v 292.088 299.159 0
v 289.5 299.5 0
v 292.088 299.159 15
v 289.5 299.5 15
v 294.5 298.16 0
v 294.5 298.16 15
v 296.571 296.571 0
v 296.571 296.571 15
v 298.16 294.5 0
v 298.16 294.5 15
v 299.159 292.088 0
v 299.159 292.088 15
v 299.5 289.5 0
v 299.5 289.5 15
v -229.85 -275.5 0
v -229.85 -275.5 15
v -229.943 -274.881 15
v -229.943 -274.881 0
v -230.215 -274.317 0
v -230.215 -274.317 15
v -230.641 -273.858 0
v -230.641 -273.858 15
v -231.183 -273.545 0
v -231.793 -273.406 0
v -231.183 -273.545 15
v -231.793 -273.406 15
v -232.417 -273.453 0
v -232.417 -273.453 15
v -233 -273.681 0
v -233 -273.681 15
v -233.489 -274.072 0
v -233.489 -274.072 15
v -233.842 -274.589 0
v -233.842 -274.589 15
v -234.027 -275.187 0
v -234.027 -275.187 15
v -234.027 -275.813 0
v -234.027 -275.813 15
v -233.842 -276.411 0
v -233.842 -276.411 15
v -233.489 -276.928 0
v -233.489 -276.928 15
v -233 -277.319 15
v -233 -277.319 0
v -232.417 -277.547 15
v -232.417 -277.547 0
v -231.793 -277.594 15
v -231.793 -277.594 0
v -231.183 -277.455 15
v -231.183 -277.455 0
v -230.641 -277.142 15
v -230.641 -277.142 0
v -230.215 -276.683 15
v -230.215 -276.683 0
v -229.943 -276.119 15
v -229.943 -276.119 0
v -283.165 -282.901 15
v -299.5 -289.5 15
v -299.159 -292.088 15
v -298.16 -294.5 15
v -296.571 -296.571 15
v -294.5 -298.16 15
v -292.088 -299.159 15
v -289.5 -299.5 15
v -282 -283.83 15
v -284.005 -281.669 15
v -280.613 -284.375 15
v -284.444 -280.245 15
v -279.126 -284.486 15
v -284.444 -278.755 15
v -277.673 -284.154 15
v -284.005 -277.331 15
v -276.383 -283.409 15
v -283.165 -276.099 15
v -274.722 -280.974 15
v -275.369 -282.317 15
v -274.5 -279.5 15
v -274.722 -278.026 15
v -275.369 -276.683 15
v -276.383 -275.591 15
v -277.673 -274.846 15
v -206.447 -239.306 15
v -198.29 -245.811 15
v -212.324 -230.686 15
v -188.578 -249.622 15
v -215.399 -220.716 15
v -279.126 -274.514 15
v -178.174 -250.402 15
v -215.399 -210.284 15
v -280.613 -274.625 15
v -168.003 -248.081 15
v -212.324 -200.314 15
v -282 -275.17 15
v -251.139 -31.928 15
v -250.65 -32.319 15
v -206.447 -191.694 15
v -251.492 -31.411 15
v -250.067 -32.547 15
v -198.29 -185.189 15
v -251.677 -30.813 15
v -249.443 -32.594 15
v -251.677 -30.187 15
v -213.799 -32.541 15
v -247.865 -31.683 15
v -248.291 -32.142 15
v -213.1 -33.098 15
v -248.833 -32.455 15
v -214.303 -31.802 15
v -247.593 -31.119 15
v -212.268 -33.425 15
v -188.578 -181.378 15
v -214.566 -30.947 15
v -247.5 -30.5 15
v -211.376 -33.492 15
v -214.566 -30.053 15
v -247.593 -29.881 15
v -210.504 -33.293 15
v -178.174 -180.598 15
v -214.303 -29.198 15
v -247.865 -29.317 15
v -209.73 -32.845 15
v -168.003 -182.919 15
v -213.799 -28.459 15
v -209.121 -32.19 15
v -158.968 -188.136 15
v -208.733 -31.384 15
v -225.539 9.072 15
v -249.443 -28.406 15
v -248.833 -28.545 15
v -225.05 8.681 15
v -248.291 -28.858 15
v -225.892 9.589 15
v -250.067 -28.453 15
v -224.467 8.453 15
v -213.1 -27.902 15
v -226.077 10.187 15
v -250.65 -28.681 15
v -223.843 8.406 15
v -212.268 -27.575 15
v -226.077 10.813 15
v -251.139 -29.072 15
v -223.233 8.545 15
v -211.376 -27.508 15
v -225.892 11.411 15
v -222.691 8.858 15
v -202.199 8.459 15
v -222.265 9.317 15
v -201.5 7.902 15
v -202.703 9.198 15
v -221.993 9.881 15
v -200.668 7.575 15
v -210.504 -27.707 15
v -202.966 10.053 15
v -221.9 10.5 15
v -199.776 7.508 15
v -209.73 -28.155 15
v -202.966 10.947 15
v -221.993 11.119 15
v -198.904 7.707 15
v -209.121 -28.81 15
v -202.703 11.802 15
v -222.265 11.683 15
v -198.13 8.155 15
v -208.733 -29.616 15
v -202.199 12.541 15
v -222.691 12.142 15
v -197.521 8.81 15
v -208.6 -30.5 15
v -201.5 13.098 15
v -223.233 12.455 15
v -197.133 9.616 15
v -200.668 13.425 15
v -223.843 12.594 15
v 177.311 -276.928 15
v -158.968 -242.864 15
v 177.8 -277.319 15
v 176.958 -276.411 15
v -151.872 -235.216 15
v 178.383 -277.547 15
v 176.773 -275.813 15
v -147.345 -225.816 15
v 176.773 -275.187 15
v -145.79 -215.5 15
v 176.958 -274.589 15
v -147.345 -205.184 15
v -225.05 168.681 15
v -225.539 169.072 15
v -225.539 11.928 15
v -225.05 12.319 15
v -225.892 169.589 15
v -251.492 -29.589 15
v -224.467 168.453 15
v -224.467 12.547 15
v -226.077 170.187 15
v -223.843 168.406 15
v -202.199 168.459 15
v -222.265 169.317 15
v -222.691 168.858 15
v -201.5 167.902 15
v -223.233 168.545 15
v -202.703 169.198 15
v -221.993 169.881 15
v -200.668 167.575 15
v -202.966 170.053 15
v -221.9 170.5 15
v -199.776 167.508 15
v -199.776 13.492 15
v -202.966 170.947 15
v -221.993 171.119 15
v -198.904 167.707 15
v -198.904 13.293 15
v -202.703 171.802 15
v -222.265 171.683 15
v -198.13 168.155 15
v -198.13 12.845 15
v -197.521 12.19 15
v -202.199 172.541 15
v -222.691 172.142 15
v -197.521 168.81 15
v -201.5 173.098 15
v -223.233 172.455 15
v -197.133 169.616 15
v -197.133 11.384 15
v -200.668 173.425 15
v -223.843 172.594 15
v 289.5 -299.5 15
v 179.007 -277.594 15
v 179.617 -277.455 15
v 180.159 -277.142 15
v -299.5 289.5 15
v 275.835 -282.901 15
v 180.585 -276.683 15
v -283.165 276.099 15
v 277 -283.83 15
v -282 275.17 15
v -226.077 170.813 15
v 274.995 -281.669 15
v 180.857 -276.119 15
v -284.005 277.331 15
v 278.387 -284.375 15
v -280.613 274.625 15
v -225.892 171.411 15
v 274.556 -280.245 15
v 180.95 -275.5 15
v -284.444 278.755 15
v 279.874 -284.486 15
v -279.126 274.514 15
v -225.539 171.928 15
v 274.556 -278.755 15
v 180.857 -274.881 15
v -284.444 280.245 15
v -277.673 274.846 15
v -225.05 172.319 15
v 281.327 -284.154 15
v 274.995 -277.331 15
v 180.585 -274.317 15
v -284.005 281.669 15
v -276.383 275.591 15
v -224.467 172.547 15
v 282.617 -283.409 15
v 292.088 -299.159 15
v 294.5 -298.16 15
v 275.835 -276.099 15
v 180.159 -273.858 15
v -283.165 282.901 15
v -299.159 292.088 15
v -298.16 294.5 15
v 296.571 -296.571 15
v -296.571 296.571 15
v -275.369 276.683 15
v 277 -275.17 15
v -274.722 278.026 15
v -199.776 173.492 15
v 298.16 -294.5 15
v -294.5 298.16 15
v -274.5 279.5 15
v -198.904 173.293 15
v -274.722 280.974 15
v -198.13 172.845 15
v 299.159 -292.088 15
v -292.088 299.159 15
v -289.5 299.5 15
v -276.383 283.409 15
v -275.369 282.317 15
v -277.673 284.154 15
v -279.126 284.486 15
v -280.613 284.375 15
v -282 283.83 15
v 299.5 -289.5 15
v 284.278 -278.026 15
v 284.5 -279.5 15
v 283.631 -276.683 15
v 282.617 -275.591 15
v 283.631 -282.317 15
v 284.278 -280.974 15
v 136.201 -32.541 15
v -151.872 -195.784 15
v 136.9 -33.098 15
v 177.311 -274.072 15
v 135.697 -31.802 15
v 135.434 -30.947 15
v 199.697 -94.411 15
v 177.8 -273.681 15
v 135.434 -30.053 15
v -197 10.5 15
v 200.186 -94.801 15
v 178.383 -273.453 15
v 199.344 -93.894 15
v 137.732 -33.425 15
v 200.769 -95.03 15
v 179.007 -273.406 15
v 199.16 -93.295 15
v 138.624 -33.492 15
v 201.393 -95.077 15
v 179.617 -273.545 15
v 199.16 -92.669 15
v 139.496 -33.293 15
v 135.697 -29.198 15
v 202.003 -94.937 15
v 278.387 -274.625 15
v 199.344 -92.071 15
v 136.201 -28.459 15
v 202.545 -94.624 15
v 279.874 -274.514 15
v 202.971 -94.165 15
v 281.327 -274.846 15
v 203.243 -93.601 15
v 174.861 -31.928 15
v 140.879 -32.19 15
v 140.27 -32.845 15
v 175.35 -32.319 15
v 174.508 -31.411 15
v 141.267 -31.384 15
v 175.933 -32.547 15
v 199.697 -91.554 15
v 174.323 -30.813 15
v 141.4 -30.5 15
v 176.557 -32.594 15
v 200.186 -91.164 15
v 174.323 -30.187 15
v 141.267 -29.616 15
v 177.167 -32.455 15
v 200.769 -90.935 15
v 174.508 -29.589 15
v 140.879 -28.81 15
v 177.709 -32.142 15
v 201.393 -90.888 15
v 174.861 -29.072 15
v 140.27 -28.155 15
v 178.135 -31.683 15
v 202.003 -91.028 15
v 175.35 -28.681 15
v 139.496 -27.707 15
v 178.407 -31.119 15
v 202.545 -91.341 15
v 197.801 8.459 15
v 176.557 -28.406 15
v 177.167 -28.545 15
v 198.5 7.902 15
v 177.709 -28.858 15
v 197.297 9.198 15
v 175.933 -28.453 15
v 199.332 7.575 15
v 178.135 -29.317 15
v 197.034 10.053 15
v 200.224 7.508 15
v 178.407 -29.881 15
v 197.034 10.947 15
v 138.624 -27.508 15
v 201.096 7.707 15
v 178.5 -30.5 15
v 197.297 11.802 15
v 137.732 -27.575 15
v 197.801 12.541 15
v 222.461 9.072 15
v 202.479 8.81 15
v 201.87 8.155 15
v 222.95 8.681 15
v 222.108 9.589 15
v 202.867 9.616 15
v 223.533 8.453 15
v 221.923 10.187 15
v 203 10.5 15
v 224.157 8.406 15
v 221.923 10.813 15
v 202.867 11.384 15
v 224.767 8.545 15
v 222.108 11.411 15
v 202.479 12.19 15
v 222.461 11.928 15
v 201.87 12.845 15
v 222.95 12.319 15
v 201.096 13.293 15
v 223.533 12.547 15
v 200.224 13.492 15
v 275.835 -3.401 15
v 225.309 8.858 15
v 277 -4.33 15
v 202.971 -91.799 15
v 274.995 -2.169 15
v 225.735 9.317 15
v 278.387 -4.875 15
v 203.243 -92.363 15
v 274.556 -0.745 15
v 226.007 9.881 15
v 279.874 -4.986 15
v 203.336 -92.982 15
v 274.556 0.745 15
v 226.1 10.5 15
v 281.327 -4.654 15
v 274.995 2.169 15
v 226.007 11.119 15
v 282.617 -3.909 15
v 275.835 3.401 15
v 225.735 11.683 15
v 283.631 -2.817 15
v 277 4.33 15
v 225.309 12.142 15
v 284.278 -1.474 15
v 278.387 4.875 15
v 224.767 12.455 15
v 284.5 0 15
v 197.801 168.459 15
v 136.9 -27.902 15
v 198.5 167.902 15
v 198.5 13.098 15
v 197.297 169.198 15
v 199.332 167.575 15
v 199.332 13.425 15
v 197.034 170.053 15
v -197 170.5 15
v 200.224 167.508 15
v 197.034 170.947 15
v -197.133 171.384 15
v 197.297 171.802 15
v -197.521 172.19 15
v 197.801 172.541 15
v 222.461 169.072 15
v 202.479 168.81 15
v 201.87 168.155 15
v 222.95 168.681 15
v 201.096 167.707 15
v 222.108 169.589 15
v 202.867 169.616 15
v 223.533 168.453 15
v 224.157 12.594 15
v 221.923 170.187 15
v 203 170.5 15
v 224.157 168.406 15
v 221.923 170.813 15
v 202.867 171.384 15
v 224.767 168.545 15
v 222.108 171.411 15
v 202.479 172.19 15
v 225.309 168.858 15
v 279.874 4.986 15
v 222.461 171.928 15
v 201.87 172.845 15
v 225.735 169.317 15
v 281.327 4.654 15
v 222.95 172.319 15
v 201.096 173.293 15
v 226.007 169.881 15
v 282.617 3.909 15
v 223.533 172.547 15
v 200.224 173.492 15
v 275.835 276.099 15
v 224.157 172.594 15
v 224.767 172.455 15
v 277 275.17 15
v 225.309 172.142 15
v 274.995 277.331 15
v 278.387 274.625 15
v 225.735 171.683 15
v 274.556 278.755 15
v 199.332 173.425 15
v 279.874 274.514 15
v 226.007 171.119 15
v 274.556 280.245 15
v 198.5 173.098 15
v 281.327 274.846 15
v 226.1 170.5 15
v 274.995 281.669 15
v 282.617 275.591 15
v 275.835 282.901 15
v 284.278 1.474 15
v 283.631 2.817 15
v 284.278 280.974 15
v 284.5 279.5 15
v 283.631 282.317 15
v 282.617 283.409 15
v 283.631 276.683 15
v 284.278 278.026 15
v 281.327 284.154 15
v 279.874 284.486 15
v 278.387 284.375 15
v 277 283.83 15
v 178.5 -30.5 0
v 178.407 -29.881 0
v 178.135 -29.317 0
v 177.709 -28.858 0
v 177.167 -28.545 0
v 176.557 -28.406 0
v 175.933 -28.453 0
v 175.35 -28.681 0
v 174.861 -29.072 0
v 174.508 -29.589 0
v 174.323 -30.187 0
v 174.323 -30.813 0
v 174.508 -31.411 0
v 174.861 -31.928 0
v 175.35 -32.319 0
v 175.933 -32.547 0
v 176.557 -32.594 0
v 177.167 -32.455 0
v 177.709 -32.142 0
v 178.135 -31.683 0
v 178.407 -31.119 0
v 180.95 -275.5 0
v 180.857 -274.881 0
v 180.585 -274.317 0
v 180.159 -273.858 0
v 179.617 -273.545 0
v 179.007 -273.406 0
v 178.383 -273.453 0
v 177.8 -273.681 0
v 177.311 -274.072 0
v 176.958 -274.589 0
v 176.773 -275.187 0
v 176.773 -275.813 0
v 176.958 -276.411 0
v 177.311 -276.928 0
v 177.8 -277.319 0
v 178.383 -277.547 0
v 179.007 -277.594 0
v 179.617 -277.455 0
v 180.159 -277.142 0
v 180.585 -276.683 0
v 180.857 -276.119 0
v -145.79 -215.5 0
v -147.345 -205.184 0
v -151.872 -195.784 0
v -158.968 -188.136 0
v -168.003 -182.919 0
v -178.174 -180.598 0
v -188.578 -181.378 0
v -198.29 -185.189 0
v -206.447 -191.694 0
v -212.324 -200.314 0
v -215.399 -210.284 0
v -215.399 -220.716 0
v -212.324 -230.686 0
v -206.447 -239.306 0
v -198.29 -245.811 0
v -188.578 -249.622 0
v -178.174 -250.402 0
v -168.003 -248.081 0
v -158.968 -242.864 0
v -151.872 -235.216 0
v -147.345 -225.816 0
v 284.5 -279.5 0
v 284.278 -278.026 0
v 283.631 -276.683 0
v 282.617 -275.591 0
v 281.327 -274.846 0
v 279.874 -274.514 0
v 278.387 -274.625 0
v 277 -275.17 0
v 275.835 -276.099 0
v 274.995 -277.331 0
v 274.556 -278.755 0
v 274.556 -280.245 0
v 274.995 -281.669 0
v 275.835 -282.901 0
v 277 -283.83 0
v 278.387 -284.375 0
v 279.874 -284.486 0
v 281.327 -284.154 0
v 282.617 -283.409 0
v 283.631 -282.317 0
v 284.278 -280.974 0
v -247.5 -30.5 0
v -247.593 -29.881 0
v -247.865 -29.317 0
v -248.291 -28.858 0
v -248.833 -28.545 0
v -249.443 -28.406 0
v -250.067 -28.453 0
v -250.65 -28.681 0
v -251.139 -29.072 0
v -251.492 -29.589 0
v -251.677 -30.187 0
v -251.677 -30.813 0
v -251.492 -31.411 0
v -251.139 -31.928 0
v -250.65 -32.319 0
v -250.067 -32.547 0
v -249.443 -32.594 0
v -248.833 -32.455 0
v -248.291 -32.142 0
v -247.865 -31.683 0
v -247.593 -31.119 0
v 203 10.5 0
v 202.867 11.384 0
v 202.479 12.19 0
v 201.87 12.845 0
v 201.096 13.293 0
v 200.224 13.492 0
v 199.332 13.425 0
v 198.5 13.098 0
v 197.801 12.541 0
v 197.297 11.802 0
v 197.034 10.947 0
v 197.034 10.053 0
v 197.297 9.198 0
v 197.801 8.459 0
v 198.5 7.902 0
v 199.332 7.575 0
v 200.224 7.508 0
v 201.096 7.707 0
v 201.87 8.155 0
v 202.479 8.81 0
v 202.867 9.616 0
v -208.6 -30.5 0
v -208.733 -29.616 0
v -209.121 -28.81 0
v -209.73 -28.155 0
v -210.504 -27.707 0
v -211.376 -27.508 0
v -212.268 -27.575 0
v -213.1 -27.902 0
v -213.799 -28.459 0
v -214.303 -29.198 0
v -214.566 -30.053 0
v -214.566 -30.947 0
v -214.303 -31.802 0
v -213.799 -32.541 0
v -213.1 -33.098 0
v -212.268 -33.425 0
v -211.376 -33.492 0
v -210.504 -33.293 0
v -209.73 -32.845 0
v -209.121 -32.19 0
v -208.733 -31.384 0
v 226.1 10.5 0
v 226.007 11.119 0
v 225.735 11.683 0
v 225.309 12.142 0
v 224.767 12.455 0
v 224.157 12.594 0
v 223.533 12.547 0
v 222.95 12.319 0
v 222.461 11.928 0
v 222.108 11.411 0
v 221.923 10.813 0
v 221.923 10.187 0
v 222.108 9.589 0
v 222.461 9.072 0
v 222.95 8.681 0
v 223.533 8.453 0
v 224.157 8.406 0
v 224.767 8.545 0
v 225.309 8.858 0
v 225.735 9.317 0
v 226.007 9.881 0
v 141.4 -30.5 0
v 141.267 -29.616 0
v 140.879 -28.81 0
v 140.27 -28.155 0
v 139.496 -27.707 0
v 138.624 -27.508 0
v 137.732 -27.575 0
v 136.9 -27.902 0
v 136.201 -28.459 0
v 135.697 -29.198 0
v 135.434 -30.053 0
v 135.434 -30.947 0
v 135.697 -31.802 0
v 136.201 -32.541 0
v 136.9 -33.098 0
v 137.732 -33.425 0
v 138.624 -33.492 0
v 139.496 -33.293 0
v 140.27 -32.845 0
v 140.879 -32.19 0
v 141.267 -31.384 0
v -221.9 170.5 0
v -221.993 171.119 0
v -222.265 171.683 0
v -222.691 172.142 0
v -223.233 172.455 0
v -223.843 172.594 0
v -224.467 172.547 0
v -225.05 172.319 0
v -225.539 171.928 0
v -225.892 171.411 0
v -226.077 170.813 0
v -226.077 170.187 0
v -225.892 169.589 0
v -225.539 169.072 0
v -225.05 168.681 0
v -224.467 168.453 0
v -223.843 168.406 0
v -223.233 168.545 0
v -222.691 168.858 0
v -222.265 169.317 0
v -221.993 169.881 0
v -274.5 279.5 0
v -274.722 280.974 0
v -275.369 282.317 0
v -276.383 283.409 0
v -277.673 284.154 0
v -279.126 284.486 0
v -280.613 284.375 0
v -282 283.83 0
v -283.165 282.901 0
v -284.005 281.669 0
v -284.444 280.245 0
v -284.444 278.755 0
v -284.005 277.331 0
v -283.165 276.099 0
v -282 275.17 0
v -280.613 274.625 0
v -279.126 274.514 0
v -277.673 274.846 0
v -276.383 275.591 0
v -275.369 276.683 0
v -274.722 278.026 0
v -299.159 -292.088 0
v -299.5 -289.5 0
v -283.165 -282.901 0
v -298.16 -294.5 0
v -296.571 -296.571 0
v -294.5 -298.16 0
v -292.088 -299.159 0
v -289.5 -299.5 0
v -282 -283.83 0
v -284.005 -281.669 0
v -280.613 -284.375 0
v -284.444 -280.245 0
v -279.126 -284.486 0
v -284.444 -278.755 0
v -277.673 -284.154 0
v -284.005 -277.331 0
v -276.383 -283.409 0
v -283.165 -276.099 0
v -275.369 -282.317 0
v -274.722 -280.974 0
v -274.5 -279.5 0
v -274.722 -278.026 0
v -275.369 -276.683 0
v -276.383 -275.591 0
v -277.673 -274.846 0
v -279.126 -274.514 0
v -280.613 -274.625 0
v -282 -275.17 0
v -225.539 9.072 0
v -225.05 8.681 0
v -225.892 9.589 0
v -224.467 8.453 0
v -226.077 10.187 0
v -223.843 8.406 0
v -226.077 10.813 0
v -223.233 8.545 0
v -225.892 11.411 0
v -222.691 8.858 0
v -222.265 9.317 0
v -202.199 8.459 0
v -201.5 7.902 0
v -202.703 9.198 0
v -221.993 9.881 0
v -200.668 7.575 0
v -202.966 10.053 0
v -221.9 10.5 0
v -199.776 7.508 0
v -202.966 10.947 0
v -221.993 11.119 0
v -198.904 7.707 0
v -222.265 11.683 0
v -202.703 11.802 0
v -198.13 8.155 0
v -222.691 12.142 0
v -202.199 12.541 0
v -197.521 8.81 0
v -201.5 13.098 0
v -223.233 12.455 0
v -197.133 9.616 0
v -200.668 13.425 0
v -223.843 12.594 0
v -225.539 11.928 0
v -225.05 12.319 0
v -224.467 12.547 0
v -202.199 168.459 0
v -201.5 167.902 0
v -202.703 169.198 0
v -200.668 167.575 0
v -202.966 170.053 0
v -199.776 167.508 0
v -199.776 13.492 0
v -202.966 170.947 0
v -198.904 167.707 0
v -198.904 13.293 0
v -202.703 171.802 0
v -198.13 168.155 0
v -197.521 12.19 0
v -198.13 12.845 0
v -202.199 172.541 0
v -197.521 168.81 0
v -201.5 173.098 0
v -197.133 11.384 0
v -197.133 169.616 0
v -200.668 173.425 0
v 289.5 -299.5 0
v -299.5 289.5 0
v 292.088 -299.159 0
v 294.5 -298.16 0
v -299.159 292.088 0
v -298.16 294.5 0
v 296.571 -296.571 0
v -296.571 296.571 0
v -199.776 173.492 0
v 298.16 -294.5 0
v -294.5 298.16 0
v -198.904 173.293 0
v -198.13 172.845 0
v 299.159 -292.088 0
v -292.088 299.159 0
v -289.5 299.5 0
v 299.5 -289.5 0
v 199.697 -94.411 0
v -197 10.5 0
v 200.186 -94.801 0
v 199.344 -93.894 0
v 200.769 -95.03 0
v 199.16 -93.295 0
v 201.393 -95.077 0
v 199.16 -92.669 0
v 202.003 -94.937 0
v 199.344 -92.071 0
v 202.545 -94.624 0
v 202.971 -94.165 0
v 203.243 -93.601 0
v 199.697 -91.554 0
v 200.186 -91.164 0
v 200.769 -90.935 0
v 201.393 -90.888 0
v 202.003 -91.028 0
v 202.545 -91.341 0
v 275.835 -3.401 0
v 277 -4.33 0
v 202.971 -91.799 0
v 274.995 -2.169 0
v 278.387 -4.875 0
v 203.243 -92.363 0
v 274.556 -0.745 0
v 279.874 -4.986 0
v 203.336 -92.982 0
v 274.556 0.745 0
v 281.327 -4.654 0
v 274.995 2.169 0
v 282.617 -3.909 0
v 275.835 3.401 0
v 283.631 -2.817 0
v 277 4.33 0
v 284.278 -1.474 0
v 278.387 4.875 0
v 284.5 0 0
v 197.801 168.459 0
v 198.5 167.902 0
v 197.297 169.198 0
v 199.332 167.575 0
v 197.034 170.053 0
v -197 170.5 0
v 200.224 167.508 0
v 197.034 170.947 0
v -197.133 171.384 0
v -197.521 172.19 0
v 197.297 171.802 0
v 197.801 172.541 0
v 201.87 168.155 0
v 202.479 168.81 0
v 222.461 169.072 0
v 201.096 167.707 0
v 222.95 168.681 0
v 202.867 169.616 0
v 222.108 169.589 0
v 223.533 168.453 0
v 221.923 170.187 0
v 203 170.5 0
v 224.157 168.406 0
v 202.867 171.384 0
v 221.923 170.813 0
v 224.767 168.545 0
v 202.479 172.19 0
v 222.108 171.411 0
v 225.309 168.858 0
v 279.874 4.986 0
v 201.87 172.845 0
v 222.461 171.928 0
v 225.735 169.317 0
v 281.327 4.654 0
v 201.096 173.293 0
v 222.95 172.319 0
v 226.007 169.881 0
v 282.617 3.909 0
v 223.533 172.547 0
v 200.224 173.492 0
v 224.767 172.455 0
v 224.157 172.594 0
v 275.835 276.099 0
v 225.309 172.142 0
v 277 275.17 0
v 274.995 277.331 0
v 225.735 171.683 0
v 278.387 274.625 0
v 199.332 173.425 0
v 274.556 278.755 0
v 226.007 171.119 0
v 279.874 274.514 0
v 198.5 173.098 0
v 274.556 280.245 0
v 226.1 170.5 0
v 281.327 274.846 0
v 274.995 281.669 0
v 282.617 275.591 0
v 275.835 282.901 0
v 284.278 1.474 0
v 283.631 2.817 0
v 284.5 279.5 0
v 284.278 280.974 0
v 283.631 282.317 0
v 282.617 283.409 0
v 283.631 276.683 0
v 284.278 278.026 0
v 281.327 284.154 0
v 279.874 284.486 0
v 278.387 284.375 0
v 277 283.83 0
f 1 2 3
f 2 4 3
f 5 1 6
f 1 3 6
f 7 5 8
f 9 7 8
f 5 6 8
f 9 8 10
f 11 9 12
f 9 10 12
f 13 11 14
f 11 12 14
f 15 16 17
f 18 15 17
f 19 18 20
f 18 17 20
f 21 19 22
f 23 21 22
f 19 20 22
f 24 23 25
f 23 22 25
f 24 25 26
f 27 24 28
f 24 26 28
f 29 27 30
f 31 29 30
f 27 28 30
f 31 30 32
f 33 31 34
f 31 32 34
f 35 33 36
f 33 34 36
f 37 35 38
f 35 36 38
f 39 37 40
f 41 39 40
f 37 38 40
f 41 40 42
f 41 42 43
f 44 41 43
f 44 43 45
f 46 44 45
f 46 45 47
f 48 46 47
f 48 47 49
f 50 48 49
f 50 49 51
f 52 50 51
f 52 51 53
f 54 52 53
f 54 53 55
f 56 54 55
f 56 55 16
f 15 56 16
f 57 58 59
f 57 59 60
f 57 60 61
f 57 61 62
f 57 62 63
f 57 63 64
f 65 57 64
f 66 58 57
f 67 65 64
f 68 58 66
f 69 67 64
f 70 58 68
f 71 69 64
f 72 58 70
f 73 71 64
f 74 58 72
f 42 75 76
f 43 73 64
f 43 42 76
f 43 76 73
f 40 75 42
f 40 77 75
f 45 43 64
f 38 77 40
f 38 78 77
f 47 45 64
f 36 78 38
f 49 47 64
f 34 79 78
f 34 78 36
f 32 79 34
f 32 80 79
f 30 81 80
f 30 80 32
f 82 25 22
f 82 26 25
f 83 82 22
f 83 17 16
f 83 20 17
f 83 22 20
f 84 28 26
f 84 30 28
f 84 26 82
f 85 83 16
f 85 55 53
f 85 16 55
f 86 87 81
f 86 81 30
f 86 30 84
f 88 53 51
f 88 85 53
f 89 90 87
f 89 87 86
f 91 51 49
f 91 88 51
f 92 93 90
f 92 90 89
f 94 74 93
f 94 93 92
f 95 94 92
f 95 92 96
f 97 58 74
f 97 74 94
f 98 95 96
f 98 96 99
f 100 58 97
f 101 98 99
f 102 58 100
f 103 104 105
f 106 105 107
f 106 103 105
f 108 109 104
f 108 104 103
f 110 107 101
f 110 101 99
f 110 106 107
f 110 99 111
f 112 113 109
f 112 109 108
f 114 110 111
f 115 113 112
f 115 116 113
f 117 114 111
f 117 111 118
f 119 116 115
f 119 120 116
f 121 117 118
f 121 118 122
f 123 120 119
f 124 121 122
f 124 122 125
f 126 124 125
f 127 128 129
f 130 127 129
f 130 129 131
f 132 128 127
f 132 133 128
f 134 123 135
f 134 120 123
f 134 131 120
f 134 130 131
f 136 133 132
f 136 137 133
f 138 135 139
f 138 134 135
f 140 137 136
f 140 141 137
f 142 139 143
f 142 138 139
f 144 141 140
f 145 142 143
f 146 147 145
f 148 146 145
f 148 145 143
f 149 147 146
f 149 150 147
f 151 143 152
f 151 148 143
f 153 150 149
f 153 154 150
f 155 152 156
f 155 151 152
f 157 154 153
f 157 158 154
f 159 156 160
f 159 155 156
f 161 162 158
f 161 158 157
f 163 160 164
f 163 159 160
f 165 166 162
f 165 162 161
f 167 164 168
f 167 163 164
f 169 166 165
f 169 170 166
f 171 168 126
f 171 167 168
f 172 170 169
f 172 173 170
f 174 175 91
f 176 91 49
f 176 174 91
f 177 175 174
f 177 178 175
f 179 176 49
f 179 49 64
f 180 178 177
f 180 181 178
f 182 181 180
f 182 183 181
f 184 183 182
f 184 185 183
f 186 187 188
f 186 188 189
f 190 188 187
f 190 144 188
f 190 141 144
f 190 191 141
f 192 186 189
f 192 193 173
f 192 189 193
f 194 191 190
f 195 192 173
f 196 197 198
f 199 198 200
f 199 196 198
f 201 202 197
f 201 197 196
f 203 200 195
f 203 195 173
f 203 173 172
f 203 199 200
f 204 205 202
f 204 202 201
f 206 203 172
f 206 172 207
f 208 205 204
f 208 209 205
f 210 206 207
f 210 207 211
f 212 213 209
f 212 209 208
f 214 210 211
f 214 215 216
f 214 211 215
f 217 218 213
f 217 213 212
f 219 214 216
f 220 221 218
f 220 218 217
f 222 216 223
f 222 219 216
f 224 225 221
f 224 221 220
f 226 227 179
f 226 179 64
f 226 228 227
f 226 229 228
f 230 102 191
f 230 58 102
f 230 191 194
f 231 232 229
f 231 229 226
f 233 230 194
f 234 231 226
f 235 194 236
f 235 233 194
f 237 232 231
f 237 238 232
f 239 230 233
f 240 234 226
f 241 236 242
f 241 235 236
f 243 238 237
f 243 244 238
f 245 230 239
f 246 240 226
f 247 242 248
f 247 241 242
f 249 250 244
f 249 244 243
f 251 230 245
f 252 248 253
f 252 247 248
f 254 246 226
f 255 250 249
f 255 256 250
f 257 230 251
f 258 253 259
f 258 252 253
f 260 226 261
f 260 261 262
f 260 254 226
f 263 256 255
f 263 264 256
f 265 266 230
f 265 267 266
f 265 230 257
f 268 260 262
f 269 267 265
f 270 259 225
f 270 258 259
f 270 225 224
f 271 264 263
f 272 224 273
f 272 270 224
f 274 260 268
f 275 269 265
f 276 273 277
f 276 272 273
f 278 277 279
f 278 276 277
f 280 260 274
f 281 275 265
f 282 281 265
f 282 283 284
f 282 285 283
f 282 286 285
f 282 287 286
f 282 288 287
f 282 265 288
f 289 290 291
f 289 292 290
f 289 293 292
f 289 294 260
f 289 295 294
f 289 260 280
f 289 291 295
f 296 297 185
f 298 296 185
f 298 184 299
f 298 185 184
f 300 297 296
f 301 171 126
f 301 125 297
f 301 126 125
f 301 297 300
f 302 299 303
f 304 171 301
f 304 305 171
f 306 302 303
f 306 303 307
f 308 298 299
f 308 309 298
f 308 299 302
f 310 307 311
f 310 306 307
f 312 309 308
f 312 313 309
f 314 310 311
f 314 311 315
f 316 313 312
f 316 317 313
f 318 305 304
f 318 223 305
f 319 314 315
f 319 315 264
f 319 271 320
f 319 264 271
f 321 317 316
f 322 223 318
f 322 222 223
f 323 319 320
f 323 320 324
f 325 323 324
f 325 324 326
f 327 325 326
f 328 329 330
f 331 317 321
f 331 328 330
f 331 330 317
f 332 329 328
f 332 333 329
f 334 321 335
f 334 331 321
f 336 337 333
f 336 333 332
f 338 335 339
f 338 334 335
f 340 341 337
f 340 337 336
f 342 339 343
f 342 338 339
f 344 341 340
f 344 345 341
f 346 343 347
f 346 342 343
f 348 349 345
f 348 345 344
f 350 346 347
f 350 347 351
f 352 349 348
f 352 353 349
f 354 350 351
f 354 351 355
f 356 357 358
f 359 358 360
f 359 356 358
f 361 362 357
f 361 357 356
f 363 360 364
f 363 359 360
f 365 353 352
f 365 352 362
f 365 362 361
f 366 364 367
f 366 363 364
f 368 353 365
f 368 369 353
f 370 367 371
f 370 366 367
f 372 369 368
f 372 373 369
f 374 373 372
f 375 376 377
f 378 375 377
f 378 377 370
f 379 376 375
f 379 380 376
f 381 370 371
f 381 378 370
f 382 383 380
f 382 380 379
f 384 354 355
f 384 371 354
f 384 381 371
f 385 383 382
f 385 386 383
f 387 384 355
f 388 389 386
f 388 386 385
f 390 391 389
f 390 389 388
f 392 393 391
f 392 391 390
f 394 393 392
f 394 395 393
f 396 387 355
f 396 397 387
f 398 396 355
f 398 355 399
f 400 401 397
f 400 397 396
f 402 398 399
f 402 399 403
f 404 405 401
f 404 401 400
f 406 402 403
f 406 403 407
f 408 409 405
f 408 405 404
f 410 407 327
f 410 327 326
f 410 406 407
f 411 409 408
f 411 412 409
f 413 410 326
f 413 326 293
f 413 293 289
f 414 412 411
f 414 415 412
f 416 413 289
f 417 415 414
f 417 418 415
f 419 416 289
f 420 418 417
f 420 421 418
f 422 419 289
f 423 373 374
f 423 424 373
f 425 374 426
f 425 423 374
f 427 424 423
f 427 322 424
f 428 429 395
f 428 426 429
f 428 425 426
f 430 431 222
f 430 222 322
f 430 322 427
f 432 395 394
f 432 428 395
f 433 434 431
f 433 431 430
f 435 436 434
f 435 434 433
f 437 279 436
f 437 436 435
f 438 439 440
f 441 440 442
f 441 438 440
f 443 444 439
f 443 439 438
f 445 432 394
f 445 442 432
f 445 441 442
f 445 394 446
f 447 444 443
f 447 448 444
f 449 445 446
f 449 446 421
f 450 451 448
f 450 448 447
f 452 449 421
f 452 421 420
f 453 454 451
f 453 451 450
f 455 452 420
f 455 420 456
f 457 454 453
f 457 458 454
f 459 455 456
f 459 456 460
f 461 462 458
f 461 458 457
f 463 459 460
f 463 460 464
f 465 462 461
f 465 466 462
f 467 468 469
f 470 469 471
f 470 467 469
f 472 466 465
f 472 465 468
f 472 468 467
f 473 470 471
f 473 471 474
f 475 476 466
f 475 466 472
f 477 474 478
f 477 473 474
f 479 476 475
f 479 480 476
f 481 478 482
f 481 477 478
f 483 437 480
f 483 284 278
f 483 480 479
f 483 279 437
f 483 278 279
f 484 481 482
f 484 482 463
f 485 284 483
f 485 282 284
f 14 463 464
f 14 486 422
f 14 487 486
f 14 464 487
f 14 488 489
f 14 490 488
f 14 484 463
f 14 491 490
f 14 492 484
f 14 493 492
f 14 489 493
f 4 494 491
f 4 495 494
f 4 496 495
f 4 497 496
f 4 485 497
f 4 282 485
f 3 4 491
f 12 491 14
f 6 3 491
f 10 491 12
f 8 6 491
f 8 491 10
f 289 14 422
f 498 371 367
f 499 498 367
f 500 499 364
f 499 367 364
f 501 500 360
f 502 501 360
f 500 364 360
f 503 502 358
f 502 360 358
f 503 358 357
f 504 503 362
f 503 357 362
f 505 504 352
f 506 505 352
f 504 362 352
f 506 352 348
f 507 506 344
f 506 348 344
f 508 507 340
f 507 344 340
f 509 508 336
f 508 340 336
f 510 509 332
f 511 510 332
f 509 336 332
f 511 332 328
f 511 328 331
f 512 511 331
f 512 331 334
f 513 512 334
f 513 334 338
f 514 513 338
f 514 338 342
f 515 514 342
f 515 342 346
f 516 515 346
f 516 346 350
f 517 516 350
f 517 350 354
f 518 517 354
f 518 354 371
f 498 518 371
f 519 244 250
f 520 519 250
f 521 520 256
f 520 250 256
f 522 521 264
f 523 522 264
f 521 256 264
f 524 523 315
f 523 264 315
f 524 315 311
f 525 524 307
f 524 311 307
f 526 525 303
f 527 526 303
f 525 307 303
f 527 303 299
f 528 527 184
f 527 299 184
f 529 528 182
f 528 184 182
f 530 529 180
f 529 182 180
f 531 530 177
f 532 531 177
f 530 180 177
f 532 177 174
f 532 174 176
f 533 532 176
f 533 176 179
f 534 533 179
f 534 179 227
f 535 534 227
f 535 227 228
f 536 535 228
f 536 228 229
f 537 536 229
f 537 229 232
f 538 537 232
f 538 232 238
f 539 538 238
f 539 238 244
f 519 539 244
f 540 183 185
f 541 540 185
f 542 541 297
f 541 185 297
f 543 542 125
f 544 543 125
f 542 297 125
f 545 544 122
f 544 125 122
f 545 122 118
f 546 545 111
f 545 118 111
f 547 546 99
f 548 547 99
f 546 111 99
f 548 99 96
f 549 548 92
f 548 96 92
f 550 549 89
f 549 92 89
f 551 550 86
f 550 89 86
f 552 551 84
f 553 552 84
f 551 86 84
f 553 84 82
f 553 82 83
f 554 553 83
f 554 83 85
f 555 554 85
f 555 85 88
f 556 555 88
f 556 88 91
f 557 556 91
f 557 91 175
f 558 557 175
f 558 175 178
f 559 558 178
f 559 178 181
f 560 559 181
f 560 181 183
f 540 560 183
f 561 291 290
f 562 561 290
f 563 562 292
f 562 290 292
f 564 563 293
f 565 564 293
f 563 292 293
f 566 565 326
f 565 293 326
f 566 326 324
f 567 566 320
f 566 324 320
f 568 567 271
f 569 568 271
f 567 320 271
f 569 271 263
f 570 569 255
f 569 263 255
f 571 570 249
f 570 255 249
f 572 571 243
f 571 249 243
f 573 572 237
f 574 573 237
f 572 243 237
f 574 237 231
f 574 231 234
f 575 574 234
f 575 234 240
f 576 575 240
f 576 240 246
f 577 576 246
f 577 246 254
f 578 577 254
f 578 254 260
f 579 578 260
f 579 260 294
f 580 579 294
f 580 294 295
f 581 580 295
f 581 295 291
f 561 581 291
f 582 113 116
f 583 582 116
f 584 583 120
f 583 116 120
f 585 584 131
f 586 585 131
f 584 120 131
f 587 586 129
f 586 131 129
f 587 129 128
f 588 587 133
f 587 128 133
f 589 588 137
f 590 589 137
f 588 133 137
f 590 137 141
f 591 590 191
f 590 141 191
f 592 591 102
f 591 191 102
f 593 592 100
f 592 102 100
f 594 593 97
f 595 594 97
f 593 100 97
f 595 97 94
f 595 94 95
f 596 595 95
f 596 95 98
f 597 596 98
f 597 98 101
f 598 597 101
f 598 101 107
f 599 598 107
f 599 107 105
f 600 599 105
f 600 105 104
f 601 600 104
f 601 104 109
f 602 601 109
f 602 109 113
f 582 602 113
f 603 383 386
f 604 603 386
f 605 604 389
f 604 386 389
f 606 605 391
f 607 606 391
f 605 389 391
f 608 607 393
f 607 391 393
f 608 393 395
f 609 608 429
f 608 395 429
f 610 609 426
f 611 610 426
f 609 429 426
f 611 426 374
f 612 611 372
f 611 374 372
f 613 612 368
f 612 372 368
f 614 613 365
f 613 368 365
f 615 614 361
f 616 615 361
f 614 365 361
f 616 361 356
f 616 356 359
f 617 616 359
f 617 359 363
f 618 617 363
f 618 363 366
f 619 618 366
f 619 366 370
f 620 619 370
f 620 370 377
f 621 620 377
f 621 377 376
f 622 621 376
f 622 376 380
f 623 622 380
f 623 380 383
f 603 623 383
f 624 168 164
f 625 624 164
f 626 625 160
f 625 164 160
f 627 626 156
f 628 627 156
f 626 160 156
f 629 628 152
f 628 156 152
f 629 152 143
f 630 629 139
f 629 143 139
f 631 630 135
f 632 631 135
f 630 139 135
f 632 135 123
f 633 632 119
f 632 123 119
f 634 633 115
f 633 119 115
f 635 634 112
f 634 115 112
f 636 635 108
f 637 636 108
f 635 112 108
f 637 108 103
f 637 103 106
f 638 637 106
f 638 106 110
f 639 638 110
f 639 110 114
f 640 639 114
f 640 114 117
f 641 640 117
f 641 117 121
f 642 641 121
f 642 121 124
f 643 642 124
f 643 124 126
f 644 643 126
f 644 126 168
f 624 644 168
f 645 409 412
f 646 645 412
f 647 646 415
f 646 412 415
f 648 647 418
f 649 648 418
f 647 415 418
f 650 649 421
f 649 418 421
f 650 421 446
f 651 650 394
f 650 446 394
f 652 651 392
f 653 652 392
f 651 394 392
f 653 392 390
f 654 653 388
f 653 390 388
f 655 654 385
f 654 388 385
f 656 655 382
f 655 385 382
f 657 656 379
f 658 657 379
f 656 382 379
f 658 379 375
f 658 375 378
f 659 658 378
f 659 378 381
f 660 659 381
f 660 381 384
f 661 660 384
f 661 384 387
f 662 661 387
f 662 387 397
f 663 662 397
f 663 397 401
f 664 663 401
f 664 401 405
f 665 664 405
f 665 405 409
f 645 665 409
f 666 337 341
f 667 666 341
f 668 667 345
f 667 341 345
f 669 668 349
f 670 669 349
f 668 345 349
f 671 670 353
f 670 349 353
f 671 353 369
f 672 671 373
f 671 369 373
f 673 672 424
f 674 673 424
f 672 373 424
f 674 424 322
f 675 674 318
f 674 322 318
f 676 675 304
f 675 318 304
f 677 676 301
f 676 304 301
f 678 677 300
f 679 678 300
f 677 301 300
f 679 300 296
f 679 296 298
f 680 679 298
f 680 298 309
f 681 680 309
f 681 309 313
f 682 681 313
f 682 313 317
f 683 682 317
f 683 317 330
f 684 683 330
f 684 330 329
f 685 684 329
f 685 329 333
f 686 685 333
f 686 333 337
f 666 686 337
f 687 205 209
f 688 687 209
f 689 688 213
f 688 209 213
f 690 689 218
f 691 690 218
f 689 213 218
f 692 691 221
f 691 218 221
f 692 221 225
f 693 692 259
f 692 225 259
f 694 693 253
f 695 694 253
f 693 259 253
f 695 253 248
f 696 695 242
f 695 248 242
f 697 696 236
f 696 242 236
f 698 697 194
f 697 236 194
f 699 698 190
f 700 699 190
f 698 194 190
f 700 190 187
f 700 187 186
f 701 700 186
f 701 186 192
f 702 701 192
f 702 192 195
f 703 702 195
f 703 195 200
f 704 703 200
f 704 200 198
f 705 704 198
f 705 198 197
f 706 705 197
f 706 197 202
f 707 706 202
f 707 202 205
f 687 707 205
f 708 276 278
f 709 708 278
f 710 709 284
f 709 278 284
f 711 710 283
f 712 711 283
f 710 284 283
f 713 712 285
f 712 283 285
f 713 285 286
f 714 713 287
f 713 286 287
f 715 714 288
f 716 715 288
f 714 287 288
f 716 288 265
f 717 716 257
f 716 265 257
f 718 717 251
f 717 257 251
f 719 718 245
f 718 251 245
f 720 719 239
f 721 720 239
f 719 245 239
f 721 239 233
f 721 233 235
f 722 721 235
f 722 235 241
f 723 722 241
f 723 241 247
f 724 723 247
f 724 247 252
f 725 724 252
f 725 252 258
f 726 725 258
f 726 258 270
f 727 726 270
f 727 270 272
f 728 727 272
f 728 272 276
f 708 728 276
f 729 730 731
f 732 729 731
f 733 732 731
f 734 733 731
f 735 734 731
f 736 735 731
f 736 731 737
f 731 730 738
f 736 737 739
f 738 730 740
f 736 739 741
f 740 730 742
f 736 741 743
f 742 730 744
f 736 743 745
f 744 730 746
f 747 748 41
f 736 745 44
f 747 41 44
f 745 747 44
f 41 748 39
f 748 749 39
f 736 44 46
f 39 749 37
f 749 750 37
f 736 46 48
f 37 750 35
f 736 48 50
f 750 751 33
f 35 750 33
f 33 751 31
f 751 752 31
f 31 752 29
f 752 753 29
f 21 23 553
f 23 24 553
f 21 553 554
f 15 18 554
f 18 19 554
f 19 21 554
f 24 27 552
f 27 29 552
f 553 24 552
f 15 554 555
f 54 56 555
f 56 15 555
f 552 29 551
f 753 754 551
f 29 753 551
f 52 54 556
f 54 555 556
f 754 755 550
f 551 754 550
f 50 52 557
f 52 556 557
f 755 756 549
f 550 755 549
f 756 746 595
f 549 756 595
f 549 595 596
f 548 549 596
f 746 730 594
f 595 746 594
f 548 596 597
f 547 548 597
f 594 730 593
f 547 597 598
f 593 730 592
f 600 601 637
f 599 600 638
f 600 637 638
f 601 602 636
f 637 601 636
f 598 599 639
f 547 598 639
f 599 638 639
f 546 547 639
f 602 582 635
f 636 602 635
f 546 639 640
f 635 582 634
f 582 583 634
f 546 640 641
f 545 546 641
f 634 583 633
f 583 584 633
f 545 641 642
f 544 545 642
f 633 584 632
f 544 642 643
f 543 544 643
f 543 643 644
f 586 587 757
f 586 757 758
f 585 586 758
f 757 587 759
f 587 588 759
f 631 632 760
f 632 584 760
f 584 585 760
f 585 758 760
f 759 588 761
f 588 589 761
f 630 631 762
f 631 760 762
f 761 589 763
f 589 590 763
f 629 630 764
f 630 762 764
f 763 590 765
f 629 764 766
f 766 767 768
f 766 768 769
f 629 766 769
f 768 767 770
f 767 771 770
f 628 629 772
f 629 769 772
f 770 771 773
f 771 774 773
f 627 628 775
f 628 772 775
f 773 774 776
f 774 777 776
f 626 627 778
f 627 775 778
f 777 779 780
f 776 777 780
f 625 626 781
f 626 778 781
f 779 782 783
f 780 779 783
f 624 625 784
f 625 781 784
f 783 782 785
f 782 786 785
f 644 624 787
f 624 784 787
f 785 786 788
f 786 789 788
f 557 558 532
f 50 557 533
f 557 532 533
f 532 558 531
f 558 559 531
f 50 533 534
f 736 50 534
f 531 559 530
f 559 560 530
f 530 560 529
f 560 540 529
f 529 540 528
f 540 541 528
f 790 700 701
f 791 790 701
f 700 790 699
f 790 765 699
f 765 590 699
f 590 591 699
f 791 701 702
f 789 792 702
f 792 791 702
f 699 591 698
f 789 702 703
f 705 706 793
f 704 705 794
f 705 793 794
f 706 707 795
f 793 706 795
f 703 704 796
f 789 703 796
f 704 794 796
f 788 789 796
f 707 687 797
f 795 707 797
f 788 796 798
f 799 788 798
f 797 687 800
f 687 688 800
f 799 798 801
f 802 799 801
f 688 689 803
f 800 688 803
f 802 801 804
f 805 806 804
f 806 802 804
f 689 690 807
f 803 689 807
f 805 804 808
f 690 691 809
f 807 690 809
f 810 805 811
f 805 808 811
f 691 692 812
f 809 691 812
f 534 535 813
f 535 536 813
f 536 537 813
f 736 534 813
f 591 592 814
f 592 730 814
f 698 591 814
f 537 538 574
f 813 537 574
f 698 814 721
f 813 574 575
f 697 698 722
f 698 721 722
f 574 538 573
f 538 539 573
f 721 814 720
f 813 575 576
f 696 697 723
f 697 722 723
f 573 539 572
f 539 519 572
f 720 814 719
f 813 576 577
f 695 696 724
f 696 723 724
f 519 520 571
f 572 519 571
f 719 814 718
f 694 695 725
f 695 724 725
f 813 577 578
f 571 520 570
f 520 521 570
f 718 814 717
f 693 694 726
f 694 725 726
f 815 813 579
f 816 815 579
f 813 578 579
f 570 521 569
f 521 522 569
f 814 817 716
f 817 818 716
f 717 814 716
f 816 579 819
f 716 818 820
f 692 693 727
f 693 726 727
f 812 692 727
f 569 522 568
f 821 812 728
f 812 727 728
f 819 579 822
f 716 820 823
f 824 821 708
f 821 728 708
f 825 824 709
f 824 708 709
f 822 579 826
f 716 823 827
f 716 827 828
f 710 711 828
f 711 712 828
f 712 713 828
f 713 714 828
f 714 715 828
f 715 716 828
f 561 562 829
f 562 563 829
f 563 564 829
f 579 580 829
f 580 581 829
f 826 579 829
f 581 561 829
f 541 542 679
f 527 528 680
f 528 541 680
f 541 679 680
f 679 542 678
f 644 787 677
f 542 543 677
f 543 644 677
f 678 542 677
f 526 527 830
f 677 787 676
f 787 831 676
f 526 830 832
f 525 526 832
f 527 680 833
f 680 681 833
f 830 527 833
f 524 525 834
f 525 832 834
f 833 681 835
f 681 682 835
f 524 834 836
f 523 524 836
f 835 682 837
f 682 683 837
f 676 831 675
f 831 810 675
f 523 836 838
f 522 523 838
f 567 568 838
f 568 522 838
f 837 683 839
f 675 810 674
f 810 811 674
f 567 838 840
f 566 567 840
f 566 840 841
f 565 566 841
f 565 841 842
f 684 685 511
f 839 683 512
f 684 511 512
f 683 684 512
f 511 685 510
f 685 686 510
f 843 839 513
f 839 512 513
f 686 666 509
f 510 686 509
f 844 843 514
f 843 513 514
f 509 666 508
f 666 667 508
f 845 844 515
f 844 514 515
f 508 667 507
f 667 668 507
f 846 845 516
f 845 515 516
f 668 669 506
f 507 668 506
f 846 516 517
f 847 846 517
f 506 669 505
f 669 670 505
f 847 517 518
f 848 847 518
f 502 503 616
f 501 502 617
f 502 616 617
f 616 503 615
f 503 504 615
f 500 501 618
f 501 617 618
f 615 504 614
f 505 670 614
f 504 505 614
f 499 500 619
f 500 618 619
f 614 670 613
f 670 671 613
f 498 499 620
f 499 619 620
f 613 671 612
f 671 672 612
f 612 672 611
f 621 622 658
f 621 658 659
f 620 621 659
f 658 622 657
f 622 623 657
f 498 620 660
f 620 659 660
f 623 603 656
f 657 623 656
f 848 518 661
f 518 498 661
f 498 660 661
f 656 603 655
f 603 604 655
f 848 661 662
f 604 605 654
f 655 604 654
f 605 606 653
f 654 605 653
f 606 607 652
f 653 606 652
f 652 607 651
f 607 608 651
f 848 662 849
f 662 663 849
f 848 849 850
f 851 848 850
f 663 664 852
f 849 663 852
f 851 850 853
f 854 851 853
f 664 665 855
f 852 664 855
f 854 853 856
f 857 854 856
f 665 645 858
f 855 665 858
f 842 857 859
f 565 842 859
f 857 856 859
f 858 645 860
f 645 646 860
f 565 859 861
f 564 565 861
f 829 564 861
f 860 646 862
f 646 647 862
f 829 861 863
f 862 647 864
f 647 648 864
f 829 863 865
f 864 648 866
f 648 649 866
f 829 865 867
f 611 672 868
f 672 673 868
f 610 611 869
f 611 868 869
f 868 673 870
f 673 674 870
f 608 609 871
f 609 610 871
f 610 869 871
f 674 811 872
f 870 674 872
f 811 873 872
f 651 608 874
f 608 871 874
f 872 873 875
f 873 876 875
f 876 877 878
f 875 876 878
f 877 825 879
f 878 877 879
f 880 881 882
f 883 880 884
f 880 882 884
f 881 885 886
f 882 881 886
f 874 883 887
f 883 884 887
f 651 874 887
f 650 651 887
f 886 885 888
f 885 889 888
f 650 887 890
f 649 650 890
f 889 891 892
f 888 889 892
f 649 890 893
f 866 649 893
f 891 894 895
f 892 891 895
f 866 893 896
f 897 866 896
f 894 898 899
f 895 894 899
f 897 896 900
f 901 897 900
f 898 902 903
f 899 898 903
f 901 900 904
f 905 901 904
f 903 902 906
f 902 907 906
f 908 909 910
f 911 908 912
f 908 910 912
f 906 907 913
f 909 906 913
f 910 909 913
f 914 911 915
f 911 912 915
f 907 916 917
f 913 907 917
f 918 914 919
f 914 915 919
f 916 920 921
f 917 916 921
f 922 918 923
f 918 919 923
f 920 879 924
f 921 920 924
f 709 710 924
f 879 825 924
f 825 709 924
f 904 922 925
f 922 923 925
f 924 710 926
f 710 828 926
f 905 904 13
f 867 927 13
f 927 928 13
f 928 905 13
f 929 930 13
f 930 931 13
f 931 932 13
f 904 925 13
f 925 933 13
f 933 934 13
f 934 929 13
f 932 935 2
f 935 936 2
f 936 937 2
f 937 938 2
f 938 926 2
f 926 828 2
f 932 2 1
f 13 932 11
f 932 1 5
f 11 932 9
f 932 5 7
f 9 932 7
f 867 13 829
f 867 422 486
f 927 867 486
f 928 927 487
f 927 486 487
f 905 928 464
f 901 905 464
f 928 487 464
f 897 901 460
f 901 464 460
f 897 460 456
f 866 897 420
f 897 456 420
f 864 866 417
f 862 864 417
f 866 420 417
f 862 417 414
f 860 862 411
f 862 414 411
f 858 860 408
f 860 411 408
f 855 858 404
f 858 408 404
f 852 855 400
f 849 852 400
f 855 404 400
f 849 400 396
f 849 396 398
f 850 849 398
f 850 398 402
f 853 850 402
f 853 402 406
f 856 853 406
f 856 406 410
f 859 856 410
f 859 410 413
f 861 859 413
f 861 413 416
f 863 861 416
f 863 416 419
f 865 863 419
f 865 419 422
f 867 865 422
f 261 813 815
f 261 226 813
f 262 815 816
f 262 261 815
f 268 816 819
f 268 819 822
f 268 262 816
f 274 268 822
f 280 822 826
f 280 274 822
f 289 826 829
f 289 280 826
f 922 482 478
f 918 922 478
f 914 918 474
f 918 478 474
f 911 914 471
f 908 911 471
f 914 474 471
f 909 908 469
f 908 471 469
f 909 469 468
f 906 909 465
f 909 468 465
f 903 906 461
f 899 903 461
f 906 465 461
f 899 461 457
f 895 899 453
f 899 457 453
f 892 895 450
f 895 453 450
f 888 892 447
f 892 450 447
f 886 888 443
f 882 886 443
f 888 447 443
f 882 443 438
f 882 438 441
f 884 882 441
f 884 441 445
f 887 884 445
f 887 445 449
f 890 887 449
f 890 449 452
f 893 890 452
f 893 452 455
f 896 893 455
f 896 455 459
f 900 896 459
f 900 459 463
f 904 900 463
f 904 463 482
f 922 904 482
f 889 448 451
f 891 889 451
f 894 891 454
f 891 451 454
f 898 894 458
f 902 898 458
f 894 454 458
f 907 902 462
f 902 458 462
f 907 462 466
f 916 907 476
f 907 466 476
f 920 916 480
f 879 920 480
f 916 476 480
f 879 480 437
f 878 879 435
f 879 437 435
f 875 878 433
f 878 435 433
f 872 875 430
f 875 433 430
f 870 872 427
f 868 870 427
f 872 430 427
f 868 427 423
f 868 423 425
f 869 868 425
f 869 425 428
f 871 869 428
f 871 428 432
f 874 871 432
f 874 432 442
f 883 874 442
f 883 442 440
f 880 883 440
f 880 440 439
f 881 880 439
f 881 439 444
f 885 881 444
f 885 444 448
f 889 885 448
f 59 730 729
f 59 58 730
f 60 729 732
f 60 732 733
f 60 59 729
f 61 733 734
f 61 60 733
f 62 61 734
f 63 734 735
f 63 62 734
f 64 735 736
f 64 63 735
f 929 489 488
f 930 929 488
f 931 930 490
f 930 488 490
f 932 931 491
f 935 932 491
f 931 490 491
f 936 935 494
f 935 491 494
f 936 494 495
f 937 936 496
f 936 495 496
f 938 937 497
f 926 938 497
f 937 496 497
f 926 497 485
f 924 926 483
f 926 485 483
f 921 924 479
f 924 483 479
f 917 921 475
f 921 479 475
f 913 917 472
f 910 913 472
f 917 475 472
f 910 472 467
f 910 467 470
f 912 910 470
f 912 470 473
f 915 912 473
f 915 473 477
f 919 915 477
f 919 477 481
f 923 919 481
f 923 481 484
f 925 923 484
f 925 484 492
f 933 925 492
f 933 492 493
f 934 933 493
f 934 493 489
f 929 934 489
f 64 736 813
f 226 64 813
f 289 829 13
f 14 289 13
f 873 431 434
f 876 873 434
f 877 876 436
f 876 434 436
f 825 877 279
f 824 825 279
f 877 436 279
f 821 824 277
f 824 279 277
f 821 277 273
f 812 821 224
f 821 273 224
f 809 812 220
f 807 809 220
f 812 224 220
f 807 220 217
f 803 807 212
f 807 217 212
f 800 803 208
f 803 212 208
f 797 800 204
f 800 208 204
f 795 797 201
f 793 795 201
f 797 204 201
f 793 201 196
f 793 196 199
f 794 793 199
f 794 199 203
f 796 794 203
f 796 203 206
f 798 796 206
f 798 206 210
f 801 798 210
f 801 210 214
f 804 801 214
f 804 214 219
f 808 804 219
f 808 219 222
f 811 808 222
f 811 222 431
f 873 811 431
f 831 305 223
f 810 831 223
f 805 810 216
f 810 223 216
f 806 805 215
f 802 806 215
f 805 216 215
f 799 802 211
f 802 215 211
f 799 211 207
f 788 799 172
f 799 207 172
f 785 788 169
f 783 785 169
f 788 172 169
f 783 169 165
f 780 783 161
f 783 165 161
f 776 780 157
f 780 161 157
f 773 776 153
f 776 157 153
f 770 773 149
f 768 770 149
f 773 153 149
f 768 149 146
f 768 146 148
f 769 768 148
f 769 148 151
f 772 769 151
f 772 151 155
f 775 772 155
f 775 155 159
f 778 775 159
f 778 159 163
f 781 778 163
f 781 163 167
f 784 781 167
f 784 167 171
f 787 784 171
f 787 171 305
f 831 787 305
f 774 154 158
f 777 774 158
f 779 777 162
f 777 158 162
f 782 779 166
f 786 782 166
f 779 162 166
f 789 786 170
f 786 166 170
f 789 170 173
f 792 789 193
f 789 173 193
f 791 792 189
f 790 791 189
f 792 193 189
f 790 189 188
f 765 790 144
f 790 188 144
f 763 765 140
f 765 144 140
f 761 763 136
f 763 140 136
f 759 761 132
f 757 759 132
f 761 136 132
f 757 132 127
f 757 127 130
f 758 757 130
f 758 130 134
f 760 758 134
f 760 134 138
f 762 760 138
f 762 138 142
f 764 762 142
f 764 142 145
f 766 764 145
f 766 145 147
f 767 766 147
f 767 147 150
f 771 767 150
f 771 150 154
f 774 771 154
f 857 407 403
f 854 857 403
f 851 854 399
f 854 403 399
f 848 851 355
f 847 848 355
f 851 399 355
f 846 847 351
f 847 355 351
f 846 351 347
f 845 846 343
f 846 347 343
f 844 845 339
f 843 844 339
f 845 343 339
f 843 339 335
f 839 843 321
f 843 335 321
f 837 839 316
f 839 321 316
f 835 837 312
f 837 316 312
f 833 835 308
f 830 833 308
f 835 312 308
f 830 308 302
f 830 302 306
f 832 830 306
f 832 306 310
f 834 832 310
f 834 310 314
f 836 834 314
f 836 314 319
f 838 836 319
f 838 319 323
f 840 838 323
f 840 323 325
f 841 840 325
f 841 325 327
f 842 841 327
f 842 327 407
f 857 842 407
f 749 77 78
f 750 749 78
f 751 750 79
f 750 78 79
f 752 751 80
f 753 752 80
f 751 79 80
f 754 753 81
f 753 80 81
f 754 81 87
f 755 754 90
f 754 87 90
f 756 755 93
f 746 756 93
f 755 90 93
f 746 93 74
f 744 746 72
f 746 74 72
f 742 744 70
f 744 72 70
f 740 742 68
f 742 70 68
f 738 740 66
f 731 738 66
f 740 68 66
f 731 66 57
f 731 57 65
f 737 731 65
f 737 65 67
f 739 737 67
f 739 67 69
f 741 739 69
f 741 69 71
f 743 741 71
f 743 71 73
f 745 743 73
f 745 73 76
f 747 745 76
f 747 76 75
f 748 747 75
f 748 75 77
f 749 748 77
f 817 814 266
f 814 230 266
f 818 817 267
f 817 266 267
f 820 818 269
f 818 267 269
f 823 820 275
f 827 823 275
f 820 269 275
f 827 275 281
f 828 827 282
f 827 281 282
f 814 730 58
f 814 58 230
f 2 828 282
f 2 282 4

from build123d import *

# Parameters (mm, degrees)
SKETCH1_W           = 599
SKETCH1_H           = 599
BOSS_EXTRUDE1_DEPTH = 15
SKETCH2_R           = 5
CUT_EXTRUDE1_DEPTH  = 16
FILLET1_R           = 10
SKETCH3_R           = 35
CUT_EXTRUDE2_DEPTH  = 16
SKETCH4_R           = 3
CUT_EXTRUDE3_DEPTH  = 16
SKETCH5_R           = 2.1
CUT_EXTRUDE4_DEPTH  = 16


with BuildPart() as part:
    # Sketch1 → Boss-Extrude1 (new body)
    with BuildSketch(Plane.XY):
        Rectangle(SKETCH1_W, SKETCH1_H)
    extrude(amount=BOSS_EXTRUDE1_DEPTH)

    # Sketch2 → Cut-Extrude1 (cut, through all)
    with BuildSketch(Plane.XY.offset(15)):
        with Locations((-279.5, -279.5)):
            Circle(SKETCH2_R)
        with Locations((279.5, -279.5)):
            Circle(SKETCH2_R)
        with Locations((-279.5, 279.5)):
            Circle(SKETCH2_R)
        with Locations((279.5, 279.5)):
            Circle(SKETCH2_R)
        with Locations((279.5, 0)):
            Circle(SKETCH2_R)
    extrude(amount=-CUT_EXTRUDE1_DEPTH, mode=Mode.SUBTRACT)

    # Fillet1
    fillet1_edges = [part.edges().sort_by_distance(p)[0] for p in [
        (-299.5, -299.5, 7.5),
        (299.5, -299.5, 7.5),
        (-299.5, 299.5, 7.5),
        (299.5, 299.5, 7.5),
    ]]
    fillet(fillet1_edges, radius=FILLET1_R)

    # Sketch3 → Cut-Extrude2 (cut, through all)
    with BuildSketch(Plane.XY.offset(15)):
        with Locations((-180.79, -215.5)):
            Circle(SKETCH3_R)
    extrude(amount=-CUT_EXTRUDE2_DEPTH, mode=Mode.SUBTRACT)

    # Sketch4 → Cut-Extrude3 (cut, through all)
    with BuildSketch(Plane.XY.offset(15)):
        with Locations((-200, 170.5)):
            Circle(SKETCH4_R)
        with Locations((-200, 10.5)):
            Circle(SKETCH4_R)
        with Locations((200, 170.5)):
            Circle(SKETCH4_R)
        with Locations((200, 10.5)):
            Circle(SKETCH4_R)
        with Locations((138.4, -30.5)):
            Circle(SKETCH4_R)
        with Locations((-211.6, -30.5)):
            Circle(SKETCH4_R)
    extrude(amount=-CUT_EXTRUDE3_DEPTH, mode=Mode.SUBTRACT)

    # Sketch5 → Cut-Extrude4 (cut, through all)
    with BuildSketch(Plane.XY.offset(15)):
        with Locations((-224, 170.5)):
            Circle(SKETCH5_R)
        with Locations((224, 170.5)):
            Circle(SKETCH5_R)
        with Locations((224, 10.5)):
            Circle(SKETCH5_R)
        with Locations((201.236161147, -92.982459034)):
            Circle(SKETCH5_R)
        with Locations((178.85, -275.5)):
            Circle(SKETCH5_R)
        with Locations((-231.95, -275.5)):
            Circle(SKETCH5_R)
        with Locations((-249.6, -30.5)):
            Circle(SKETCH5_R)
        with Locations((-224, 10.5)):
            Circle(SKETCH5_R)
        with Locations((176.4, -30.5)):
            Circle(SKETCH5_R)
    extrude(amount=-CUT_EXTRUDE4_DEPTH, mode=Mode.SUBTRACT)


solid = part.part
